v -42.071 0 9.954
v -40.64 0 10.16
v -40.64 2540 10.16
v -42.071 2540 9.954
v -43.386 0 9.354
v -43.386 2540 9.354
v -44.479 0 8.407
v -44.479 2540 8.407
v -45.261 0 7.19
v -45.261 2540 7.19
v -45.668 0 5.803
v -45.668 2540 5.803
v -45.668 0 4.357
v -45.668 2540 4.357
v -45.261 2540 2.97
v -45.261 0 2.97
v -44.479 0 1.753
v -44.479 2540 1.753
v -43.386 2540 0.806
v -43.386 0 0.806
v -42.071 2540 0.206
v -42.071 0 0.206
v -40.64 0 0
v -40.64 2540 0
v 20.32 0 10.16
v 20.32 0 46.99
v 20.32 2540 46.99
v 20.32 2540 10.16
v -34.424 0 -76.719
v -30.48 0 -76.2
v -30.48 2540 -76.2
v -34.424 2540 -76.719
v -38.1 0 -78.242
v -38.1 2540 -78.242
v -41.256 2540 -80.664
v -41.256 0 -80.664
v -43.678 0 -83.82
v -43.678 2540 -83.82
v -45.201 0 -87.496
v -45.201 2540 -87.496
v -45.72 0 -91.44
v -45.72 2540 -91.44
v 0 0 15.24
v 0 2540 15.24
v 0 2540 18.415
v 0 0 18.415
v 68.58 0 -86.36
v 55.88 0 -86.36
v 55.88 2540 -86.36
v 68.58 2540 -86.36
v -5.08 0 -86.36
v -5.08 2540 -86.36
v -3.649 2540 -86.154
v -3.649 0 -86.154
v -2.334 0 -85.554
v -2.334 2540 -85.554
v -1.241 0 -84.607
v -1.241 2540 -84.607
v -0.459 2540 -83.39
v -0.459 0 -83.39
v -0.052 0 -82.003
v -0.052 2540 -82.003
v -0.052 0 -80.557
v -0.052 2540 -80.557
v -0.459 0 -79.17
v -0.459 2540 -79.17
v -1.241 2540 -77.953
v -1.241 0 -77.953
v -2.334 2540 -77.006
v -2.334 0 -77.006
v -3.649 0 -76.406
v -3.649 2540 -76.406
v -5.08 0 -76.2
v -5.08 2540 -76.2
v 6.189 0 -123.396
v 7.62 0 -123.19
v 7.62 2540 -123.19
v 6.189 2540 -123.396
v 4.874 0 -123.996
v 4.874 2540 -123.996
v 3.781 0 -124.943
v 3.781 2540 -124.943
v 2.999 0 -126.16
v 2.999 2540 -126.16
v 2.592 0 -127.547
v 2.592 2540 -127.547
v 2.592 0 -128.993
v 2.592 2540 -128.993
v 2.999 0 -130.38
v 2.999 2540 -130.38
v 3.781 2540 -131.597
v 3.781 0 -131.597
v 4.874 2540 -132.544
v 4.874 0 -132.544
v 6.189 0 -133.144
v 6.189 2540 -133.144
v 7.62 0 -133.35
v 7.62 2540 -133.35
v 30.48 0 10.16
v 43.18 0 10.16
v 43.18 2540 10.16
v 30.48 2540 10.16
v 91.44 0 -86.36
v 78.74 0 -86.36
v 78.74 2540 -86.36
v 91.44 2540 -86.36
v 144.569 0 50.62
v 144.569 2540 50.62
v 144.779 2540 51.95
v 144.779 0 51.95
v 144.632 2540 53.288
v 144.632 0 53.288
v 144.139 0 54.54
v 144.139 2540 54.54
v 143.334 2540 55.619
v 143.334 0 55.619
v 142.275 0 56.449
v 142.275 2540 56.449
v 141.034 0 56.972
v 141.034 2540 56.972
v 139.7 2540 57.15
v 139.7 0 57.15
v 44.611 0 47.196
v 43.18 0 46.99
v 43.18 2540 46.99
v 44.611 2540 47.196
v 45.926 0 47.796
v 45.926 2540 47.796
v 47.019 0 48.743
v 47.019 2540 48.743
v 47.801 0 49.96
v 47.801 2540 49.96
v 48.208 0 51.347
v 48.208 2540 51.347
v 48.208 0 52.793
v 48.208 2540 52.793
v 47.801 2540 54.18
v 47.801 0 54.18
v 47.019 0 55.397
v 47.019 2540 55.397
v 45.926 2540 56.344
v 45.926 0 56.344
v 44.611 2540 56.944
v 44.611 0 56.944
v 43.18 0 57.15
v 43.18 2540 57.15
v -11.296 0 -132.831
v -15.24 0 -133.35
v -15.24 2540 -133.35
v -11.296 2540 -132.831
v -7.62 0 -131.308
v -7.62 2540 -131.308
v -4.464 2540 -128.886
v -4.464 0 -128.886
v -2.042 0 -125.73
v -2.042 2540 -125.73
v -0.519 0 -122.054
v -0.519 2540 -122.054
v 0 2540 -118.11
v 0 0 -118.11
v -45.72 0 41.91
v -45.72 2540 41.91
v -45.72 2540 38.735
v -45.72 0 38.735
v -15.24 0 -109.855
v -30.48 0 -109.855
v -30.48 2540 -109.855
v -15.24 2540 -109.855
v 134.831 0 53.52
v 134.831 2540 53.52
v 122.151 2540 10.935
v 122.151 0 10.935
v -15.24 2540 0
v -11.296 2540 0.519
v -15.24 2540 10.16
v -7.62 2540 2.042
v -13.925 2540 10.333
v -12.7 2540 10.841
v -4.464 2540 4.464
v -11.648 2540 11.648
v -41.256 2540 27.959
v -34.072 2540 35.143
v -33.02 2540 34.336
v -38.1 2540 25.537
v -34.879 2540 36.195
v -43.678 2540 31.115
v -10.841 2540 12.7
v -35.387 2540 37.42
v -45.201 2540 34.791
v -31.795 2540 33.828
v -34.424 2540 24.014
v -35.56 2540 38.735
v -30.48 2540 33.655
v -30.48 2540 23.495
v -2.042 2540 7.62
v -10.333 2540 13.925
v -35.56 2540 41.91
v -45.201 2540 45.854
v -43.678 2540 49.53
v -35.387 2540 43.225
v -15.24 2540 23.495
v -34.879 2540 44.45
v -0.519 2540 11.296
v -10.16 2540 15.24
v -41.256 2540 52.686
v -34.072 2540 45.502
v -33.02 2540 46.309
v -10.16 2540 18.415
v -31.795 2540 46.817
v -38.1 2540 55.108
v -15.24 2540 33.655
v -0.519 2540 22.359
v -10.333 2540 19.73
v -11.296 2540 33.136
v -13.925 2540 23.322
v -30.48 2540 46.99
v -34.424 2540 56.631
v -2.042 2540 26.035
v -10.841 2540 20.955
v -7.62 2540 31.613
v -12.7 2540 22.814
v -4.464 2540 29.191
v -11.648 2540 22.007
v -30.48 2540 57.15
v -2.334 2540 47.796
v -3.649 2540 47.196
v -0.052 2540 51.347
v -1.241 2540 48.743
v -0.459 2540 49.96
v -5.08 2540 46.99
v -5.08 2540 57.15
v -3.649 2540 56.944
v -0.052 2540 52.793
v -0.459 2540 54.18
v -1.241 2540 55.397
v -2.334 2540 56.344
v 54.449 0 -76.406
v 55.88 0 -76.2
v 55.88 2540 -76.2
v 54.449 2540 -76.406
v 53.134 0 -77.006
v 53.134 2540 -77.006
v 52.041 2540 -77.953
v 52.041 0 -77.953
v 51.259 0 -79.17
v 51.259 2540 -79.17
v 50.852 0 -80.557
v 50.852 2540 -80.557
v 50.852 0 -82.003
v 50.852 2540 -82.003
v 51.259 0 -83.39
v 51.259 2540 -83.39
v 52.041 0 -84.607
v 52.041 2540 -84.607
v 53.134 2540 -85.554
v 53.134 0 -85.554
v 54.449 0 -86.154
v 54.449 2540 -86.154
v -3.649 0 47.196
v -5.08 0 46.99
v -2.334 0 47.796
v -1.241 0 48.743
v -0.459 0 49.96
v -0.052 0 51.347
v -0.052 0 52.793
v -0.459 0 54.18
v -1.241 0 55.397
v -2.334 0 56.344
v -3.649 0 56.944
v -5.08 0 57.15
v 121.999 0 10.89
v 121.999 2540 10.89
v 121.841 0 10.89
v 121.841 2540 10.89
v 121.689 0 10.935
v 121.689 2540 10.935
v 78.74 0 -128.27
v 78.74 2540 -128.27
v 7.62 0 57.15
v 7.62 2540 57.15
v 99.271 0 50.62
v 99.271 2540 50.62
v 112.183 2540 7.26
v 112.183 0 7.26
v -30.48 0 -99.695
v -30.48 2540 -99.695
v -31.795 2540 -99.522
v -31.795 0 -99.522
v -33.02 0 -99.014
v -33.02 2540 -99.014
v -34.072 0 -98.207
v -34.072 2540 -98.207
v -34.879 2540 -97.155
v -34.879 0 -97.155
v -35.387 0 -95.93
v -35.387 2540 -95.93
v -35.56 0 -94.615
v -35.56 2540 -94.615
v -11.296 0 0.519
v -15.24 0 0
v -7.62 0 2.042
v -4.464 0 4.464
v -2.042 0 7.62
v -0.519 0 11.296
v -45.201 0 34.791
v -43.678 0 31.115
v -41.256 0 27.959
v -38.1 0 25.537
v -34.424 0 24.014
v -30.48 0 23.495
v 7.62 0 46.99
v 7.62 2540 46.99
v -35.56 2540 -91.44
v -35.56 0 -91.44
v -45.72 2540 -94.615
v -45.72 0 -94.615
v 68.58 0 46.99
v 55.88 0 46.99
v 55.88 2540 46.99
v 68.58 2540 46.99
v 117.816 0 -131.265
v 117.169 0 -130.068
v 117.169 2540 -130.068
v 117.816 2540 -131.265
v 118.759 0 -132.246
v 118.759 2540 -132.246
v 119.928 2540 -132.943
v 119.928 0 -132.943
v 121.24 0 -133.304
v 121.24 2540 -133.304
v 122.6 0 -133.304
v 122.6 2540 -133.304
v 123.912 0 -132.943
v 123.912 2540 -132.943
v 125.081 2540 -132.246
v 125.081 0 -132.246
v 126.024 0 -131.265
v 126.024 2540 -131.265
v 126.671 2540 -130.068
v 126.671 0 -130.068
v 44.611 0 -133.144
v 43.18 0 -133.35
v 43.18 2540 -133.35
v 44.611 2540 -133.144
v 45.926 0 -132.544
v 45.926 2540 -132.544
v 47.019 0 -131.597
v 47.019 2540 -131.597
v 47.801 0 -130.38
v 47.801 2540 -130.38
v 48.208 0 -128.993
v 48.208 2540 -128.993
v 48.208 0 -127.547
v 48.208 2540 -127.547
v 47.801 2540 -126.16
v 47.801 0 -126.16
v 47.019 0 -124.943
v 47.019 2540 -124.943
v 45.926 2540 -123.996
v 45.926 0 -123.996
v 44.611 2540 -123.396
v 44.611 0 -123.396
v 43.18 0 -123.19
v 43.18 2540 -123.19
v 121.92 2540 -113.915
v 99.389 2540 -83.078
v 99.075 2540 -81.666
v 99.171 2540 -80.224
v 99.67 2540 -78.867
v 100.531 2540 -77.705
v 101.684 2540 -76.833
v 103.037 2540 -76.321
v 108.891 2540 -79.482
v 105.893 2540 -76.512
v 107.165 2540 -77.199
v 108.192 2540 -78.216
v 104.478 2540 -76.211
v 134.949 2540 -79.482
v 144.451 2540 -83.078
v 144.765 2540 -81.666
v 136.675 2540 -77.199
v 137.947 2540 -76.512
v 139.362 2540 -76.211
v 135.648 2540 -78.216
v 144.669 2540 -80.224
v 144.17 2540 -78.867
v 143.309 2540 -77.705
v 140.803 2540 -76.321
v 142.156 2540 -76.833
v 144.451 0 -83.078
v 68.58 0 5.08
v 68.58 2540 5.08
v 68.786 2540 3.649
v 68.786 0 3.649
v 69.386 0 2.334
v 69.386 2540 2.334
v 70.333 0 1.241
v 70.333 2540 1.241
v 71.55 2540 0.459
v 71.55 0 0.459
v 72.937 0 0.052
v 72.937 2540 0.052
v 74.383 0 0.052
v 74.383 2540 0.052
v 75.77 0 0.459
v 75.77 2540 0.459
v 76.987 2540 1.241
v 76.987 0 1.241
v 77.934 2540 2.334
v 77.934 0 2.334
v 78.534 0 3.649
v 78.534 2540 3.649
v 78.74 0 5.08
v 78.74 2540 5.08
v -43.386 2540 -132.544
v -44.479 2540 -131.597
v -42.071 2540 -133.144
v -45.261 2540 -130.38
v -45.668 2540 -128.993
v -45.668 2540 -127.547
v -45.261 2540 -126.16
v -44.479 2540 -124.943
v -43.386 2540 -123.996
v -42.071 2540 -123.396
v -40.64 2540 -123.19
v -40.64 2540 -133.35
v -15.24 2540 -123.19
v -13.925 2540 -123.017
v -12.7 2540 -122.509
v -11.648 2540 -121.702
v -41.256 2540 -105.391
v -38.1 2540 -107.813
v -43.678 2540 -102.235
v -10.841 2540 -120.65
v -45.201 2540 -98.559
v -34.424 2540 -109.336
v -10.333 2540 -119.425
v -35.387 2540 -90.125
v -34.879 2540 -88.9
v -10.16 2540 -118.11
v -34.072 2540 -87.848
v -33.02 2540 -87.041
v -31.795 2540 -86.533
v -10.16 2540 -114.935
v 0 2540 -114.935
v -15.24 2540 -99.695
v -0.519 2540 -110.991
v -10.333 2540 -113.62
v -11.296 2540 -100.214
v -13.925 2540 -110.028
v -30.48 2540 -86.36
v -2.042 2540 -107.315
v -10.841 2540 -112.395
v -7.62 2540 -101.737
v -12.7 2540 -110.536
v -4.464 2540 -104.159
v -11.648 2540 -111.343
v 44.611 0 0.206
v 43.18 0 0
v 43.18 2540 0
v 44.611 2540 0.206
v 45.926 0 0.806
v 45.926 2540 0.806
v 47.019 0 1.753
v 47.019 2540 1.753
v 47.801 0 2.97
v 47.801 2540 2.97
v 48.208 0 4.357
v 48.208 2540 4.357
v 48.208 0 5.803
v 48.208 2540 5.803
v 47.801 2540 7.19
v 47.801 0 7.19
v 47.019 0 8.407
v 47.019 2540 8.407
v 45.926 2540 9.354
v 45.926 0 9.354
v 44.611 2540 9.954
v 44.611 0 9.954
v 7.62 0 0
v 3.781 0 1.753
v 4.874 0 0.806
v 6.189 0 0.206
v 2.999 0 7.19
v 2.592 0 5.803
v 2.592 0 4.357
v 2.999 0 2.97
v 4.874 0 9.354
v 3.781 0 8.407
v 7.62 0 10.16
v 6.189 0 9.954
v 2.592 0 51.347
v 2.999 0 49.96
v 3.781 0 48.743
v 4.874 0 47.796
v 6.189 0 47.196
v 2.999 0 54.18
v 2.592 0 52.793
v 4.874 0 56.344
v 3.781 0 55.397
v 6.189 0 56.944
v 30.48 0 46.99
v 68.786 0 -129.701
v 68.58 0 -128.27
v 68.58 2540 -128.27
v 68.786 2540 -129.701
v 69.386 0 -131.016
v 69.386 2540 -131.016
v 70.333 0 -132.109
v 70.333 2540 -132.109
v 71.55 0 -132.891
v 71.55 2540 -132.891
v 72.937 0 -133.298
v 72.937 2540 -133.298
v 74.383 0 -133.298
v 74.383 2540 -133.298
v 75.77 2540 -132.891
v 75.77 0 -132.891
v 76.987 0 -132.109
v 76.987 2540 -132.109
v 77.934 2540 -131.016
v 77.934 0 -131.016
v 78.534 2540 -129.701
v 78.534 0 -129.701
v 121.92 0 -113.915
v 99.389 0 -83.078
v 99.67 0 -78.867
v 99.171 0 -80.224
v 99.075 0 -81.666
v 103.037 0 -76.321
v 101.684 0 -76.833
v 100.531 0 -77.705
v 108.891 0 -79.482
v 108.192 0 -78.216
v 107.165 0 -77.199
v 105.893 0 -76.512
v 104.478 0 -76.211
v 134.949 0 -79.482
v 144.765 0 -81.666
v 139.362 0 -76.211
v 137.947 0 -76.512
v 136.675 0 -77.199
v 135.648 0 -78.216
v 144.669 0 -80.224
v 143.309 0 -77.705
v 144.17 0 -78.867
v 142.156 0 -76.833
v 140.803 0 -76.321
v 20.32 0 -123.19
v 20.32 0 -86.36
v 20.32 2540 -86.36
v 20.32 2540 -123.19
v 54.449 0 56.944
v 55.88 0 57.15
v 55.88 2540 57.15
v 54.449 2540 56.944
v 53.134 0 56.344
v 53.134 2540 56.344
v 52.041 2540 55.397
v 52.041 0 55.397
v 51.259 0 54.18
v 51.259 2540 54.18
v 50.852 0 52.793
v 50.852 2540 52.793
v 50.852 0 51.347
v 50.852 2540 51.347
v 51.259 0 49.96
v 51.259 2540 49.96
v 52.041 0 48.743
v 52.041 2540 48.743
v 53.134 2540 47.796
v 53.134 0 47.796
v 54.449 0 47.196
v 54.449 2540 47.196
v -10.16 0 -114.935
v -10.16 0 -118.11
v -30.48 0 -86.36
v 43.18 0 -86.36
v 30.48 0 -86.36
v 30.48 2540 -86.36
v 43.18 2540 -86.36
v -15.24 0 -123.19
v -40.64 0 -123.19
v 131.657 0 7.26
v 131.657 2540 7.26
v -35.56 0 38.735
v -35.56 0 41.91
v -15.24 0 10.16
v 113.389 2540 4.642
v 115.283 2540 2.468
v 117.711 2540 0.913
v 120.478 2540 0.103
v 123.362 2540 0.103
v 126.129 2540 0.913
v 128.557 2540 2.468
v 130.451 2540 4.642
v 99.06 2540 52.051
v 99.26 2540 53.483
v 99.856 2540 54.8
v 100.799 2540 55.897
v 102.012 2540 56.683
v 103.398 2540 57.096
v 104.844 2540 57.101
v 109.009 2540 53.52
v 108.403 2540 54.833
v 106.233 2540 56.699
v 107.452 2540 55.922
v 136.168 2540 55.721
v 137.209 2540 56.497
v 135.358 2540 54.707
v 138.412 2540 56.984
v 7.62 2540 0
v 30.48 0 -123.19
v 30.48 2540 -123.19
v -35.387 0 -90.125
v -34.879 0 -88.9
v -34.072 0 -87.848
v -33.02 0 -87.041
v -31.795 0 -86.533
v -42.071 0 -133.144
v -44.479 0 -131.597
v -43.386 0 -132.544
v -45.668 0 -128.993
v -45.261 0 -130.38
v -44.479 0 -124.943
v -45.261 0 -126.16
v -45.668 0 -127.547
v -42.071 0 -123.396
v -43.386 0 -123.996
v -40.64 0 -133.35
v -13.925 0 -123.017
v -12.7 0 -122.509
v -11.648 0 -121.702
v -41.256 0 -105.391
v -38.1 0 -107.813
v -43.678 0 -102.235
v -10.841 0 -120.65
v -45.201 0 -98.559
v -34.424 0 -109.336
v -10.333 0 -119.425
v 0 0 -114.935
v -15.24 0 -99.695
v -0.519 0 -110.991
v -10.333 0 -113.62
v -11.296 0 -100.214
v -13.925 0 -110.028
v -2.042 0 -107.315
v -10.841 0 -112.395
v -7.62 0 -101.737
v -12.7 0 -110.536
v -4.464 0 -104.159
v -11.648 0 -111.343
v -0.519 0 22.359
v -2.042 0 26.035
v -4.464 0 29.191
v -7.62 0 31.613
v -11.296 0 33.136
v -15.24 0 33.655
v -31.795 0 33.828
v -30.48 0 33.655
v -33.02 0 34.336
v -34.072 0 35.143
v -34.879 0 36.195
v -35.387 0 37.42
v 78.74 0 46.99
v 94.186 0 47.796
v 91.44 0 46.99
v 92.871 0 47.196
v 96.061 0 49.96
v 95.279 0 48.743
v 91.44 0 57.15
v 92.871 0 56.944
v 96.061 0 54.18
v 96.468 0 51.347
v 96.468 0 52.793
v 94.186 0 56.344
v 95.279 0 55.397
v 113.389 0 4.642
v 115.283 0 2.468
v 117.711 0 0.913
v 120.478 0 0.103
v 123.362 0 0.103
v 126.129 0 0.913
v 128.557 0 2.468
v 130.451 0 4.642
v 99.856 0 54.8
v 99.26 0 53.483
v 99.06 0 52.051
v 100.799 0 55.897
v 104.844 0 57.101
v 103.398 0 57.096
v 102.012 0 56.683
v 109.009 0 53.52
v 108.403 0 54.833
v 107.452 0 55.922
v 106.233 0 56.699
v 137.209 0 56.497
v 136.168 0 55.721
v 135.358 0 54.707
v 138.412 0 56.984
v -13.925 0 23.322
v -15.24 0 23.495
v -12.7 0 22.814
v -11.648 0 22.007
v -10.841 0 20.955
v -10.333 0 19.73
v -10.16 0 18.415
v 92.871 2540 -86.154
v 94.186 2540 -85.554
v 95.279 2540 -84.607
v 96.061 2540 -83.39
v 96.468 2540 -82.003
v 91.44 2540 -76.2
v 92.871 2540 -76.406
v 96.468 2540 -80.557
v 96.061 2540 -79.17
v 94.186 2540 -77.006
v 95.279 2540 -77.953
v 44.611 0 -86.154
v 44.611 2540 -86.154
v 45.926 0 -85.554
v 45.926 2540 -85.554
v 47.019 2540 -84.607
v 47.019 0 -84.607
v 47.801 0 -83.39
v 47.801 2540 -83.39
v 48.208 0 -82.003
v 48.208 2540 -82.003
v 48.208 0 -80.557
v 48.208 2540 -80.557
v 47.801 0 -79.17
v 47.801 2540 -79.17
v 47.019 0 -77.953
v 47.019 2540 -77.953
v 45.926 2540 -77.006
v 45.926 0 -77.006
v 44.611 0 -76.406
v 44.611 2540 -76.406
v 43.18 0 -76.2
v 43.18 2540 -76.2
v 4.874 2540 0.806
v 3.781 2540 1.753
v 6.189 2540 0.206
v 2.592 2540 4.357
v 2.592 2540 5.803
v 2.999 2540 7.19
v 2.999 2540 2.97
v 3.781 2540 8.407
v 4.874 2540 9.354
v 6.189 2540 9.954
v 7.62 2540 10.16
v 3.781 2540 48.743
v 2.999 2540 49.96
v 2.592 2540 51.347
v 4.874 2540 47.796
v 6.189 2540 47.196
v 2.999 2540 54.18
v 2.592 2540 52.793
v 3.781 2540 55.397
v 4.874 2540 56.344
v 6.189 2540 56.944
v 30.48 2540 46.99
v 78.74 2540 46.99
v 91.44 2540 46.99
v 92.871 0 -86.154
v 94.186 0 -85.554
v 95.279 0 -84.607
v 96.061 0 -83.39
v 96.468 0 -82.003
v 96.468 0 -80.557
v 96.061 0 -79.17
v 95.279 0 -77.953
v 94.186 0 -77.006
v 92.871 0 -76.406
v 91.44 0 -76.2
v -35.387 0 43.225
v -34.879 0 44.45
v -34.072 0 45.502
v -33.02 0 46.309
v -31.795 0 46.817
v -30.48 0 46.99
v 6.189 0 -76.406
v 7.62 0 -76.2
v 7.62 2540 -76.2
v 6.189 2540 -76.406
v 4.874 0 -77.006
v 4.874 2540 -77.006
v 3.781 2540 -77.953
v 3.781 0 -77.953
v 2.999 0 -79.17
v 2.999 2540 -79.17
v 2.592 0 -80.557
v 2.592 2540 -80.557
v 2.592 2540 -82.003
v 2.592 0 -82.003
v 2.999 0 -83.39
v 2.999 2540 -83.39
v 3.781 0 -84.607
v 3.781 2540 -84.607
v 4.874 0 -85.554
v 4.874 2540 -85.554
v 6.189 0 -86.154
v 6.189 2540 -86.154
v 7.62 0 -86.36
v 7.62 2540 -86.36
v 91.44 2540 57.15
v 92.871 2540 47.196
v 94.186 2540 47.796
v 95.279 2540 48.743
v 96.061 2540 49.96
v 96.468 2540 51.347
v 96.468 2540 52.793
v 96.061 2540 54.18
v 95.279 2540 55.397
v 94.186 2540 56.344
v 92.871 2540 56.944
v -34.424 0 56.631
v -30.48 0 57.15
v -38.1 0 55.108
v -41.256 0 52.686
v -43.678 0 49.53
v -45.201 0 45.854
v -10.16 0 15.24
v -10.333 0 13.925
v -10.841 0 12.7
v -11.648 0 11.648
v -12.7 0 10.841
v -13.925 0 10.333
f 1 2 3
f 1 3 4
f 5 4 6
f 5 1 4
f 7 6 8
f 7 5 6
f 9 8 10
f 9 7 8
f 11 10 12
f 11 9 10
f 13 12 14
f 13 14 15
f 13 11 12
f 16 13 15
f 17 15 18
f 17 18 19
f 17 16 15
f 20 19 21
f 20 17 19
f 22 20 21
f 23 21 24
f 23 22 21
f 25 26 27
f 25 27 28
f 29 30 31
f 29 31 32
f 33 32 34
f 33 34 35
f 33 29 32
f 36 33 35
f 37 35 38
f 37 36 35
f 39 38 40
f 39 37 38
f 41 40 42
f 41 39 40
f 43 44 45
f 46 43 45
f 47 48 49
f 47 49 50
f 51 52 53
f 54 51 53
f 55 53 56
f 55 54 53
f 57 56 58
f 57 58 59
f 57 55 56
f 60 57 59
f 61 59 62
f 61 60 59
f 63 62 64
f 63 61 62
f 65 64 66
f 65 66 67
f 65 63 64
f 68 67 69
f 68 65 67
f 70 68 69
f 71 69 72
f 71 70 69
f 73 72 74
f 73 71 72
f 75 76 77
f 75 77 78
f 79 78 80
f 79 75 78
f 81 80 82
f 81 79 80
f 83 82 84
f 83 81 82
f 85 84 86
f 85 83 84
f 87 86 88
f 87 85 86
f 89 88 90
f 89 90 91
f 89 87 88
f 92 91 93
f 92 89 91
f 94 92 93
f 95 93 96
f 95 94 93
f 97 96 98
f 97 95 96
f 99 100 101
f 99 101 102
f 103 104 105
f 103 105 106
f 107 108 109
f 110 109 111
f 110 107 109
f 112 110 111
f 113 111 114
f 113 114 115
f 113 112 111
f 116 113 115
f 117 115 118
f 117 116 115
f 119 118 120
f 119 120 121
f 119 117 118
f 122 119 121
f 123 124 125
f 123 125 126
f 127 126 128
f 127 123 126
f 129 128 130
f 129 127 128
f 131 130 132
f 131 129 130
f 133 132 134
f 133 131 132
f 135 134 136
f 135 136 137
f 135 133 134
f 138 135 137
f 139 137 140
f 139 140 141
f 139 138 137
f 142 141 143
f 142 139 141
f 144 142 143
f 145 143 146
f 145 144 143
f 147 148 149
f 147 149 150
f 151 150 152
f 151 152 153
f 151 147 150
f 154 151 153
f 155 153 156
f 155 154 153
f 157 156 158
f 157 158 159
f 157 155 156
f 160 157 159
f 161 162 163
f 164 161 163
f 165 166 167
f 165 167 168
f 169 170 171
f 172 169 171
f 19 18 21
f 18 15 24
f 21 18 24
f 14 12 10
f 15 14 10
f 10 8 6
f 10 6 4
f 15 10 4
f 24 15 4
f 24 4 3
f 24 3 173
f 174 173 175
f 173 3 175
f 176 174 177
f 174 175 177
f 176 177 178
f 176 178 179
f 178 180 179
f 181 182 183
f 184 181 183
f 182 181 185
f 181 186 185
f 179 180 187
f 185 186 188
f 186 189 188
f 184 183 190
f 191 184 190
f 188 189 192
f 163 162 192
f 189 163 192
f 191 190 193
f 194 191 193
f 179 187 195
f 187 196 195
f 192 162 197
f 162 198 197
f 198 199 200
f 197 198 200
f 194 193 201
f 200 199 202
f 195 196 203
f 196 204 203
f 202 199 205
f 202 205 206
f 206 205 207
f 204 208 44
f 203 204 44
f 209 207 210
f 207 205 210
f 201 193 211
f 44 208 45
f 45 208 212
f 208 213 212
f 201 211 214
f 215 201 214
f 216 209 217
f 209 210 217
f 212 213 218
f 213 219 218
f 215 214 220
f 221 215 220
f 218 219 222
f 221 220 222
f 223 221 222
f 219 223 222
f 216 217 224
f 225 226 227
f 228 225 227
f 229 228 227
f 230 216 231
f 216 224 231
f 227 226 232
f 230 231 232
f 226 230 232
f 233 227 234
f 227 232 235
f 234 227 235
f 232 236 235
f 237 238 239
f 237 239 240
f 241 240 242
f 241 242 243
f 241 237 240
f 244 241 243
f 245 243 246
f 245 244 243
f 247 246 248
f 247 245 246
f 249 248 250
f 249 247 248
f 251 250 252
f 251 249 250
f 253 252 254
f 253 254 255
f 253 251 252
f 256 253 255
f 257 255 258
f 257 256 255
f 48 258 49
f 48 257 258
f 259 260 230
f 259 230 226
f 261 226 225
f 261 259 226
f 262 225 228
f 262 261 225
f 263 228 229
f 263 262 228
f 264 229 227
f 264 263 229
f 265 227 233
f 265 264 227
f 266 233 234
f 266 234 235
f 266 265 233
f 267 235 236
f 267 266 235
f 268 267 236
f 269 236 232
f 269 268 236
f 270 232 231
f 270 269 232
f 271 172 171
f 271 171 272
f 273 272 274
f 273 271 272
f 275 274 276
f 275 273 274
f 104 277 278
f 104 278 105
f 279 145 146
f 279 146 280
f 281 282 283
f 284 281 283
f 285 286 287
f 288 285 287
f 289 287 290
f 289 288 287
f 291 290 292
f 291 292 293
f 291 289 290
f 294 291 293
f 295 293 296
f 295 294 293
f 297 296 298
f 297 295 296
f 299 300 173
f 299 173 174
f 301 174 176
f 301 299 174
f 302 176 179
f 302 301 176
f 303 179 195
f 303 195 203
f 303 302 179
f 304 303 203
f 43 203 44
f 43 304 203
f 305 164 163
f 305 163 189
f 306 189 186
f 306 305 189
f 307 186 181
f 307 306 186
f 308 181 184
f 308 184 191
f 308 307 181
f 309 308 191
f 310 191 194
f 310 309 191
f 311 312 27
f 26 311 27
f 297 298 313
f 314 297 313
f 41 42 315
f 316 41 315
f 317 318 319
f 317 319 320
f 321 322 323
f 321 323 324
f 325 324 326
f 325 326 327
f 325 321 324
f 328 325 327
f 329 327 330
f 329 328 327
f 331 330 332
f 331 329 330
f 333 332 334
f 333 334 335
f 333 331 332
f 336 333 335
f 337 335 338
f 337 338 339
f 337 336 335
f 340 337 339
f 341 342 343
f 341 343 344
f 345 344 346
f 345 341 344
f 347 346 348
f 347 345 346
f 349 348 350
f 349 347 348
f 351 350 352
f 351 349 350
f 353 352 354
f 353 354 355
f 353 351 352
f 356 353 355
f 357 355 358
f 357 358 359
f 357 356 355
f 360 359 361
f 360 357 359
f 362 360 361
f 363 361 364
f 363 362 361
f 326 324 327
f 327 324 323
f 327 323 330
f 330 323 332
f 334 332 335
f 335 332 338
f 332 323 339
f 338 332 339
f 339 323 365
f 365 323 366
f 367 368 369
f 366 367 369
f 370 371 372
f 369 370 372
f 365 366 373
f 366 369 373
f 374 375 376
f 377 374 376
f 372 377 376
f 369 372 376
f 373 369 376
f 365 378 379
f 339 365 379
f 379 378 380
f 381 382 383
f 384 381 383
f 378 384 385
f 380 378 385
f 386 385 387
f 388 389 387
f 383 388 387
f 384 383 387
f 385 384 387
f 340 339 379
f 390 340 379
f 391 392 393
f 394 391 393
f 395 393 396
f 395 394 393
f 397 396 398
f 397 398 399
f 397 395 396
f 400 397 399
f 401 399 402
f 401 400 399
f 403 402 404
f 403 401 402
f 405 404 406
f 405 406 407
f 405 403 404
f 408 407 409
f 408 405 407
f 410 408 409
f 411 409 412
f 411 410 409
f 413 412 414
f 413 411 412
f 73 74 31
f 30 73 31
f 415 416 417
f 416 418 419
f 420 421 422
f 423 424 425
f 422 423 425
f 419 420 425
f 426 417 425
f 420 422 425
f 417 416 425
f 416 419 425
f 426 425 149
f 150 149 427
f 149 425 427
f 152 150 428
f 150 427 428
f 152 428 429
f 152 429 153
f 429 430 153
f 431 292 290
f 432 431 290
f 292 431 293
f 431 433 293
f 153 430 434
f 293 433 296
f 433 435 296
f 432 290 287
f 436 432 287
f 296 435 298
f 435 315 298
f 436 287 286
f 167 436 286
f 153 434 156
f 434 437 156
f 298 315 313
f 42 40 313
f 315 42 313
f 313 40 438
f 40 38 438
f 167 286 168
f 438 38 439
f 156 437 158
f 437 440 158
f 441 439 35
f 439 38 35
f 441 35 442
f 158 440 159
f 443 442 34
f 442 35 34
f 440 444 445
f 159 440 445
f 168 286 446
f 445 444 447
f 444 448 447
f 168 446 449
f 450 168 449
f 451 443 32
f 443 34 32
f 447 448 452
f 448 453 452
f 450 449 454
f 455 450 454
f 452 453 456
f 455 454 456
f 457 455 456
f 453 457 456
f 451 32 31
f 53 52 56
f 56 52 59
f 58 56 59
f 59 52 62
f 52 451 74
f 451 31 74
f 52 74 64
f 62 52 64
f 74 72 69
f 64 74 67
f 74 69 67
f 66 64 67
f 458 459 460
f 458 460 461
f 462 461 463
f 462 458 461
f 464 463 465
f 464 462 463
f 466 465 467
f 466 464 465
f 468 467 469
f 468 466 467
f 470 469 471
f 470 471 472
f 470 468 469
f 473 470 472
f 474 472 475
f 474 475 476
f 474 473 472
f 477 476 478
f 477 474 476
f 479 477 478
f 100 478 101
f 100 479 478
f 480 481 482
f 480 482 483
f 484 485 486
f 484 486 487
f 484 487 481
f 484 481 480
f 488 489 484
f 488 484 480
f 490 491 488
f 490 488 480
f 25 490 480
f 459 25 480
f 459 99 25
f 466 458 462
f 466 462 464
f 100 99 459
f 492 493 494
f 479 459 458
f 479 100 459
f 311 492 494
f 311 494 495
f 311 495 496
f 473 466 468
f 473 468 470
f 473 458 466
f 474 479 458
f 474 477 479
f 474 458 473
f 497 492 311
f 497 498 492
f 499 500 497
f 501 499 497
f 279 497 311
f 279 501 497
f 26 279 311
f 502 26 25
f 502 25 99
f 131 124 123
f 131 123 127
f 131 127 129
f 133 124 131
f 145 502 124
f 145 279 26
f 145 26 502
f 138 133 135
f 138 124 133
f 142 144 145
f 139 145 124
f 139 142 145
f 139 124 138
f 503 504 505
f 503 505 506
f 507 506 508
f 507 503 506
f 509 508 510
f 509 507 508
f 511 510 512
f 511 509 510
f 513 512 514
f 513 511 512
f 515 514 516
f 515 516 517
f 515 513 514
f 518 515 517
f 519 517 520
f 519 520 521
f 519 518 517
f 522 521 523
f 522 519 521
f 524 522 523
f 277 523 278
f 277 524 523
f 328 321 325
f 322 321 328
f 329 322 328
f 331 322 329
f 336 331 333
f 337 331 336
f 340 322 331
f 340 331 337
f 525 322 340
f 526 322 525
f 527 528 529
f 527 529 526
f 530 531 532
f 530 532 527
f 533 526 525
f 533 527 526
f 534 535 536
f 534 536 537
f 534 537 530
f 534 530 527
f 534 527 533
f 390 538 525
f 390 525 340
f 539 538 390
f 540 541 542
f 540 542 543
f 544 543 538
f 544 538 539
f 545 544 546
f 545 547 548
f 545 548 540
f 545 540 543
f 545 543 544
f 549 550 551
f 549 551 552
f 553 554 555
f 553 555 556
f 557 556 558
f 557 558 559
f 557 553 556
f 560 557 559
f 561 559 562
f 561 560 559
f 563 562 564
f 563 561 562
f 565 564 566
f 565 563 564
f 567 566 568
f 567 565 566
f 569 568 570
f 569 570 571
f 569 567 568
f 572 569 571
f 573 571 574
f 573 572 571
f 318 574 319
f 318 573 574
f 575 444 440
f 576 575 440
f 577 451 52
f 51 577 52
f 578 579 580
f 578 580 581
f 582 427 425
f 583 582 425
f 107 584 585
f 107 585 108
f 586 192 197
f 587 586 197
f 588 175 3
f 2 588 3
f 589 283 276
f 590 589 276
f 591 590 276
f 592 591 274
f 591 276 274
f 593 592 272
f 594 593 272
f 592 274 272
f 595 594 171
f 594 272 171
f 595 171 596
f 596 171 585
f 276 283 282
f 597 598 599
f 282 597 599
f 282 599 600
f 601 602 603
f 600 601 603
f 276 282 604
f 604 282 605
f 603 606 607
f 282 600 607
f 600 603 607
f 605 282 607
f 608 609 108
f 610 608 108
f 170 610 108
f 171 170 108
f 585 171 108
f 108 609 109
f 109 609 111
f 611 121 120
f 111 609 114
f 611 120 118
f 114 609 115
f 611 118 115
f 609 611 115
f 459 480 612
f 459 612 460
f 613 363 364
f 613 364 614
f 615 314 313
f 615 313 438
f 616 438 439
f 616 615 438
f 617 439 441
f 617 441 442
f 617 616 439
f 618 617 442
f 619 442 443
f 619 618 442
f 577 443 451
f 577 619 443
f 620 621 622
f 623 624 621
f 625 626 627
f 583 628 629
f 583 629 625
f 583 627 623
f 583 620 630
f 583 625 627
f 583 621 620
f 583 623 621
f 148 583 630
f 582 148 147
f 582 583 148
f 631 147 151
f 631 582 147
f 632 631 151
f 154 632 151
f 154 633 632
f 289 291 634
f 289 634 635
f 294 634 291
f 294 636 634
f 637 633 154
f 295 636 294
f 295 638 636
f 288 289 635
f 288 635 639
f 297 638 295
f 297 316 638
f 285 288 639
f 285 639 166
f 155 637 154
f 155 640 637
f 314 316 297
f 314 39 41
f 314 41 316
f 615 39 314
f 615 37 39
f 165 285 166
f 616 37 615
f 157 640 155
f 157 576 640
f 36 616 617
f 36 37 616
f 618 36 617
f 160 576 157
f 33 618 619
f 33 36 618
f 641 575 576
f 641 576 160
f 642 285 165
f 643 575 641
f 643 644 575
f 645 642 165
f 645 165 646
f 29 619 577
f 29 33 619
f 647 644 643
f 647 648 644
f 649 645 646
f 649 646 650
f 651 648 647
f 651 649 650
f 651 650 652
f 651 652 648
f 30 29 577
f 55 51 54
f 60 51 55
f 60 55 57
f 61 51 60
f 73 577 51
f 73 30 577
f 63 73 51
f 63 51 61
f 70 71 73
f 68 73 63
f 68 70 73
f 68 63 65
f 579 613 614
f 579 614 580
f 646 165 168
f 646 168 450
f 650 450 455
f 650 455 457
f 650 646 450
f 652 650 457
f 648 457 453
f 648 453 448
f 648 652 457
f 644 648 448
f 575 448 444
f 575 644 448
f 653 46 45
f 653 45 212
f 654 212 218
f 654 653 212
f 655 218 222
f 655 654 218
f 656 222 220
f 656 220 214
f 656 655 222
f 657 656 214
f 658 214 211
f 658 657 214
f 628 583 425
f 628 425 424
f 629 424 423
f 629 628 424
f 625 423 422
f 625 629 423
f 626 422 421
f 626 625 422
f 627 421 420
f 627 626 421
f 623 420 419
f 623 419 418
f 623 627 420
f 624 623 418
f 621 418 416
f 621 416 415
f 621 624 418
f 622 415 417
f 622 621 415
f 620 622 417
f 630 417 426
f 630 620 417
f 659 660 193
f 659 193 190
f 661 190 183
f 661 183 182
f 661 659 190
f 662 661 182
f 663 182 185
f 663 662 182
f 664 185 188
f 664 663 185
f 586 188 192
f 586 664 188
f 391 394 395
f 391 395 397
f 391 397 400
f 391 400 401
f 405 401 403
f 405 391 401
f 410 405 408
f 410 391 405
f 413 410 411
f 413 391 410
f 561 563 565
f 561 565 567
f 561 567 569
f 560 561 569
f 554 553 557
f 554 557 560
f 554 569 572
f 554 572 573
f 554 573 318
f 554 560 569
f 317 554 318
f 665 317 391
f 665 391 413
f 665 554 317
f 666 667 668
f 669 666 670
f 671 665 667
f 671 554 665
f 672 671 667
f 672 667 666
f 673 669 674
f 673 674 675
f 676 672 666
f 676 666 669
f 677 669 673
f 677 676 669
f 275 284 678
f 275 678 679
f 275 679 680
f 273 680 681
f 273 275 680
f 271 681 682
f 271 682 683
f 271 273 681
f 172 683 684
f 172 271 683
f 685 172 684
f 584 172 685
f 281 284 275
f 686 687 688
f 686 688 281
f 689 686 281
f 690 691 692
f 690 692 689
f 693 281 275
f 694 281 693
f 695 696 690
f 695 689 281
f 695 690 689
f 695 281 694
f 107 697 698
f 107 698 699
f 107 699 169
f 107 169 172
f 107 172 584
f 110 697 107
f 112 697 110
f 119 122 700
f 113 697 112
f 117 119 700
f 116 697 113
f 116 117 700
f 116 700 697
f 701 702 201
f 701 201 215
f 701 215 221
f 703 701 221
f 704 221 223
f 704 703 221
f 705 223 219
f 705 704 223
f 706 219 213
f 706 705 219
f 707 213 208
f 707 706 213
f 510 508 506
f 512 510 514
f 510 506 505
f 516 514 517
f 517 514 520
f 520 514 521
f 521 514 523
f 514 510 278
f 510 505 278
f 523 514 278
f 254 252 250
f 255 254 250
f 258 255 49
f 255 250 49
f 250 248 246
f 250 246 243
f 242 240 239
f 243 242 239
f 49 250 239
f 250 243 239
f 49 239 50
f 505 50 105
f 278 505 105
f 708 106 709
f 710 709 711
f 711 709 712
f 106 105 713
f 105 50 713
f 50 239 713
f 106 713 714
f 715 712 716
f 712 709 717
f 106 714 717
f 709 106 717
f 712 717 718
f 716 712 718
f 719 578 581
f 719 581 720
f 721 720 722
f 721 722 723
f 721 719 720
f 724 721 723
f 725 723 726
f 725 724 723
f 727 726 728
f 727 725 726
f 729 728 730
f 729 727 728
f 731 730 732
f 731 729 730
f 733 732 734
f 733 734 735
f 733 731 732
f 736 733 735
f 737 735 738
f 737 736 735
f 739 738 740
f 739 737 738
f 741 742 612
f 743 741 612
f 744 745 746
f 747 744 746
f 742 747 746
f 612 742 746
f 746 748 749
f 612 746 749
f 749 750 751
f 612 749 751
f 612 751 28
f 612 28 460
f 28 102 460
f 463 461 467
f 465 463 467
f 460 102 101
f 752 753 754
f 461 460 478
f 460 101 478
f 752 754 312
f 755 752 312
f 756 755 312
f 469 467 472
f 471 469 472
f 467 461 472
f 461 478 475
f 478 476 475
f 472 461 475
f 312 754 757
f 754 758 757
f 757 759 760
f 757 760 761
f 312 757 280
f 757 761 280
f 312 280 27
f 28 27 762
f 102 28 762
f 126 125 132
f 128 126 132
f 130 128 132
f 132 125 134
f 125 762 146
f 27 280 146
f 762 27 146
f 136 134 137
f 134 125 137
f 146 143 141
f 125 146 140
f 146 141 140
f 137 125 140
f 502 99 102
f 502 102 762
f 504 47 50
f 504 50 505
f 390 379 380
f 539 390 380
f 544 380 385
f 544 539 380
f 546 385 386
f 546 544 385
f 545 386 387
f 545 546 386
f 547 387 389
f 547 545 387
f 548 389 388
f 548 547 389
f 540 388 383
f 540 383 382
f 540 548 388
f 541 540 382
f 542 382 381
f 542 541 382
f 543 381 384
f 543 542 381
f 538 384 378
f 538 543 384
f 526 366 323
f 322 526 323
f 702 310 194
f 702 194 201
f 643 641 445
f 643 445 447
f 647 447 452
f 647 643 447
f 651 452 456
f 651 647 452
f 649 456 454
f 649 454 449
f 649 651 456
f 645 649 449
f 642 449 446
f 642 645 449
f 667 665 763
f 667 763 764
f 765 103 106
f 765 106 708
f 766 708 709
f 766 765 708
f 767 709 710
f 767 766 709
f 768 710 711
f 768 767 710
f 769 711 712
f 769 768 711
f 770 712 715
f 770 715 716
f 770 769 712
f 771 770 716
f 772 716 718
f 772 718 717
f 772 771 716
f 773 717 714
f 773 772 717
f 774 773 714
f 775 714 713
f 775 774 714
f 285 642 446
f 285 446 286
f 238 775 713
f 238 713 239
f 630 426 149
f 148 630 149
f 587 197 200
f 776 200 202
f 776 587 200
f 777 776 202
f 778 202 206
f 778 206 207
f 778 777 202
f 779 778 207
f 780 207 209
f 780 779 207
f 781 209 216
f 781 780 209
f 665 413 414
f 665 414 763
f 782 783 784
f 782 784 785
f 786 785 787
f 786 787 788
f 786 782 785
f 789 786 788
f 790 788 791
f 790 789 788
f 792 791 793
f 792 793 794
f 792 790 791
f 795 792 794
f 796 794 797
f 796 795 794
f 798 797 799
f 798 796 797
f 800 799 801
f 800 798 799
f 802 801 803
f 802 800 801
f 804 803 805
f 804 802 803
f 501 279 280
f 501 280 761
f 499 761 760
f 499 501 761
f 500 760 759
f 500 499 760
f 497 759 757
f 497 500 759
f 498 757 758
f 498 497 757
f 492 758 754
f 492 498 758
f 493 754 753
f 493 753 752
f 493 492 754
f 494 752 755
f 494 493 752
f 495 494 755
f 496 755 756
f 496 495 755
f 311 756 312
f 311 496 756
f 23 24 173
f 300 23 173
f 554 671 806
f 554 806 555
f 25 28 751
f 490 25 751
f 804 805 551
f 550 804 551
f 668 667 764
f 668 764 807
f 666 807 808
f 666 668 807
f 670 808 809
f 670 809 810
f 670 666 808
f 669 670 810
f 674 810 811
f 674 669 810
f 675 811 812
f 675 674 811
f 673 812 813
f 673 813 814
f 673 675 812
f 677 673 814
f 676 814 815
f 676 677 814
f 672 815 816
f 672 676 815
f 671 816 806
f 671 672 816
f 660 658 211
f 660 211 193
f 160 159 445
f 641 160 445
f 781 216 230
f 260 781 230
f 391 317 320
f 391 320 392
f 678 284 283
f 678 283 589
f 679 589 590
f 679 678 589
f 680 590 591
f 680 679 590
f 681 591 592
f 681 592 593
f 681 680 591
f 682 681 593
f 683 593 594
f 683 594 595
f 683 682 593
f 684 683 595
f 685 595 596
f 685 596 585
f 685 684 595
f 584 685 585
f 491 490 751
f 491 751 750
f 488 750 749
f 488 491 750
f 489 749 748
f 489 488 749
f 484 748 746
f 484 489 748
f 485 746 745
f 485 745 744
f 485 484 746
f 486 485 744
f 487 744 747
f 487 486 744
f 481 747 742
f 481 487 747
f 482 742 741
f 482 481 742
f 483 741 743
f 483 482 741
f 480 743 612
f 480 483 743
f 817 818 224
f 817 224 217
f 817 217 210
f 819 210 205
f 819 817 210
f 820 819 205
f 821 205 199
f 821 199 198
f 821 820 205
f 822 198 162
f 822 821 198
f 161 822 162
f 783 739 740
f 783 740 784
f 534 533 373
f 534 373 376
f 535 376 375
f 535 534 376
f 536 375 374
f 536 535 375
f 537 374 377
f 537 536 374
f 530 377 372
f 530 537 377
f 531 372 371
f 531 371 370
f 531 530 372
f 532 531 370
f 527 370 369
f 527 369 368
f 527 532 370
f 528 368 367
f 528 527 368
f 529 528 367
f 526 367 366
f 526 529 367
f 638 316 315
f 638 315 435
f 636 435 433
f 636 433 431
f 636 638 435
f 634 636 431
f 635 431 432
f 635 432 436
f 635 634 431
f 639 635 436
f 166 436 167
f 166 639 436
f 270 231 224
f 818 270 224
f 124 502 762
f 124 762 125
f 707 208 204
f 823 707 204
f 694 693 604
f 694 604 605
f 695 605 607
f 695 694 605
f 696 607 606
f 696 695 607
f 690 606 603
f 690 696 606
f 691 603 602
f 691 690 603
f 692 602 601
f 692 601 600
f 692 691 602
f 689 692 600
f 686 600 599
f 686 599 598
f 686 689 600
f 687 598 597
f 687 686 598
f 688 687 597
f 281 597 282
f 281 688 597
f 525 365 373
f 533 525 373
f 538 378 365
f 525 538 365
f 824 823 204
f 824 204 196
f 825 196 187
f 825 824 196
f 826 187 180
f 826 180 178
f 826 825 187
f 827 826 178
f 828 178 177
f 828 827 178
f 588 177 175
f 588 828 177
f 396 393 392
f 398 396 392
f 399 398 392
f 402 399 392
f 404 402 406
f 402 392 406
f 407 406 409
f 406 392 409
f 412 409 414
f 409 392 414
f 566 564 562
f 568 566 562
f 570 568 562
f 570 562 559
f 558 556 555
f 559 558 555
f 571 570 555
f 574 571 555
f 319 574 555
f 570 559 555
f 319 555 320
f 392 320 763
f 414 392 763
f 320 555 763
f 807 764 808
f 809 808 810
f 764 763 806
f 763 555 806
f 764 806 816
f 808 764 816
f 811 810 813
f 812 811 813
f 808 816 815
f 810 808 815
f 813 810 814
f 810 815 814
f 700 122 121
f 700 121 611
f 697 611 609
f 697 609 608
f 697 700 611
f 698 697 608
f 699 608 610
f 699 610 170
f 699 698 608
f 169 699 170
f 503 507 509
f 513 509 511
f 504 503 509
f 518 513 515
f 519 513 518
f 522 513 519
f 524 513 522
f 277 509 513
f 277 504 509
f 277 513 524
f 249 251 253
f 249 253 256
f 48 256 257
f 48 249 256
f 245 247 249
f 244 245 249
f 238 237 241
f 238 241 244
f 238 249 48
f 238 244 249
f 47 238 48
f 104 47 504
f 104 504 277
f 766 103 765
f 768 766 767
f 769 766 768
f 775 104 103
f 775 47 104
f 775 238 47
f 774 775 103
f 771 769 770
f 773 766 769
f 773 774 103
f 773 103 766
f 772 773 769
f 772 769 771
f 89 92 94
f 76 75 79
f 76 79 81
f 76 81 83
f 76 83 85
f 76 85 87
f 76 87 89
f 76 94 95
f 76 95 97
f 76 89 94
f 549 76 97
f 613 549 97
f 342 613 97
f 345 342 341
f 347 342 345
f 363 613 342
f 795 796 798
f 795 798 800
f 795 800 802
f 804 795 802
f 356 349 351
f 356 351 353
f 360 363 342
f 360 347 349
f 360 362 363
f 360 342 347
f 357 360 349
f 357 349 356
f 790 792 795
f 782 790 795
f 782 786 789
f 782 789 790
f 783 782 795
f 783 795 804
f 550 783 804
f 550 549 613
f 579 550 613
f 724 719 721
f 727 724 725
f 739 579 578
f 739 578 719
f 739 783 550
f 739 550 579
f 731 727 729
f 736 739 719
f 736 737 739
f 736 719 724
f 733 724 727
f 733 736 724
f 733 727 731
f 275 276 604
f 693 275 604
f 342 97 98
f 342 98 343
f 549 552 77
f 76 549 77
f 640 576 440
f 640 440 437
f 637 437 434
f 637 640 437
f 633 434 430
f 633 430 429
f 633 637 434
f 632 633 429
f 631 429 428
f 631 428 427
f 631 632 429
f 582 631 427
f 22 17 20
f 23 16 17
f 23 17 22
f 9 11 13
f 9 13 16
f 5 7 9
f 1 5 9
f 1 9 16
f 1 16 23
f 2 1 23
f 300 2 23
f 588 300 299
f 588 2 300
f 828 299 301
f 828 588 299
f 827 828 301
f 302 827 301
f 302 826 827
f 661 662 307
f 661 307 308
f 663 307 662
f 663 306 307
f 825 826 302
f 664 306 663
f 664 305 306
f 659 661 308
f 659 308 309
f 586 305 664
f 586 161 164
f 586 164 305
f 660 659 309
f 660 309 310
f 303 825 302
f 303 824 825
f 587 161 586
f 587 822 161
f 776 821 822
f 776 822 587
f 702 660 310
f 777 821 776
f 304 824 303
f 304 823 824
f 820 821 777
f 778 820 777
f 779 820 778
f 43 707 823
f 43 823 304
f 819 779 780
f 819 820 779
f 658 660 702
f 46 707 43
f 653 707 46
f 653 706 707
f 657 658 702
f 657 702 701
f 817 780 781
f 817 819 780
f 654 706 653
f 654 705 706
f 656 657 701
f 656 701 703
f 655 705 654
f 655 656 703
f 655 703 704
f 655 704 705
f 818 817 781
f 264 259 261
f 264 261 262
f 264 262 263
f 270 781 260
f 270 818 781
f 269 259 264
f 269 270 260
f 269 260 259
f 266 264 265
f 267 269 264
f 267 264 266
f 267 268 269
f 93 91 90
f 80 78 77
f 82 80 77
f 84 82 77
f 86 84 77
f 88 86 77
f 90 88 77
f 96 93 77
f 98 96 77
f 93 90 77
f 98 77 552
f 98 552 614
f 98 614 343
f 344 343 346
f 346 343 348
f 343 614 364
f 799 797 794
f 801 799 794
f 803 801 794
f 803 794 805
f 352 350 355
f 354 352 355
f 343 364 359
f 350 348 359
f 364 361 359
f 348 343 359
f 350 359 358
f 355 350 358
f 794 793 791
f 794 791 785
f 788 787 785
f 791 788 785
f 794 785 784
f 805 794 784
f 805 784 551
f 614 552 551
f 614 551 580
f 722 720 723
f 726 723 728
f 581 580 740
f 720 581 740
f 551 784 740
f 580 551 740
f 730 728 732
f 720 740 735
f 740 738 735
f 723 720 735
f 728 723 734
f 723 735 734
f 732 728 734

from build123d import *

# Parameters (mm, degrees)
F1_DEPTH = 2540


with BuildPart() as f1:
    # F0 (on Front) → F1 (new body)
    with BuildSketch(Plane.XZ):
        with BuildLine():
            ThreePointArc((-40.64, 10.16), (-45.72, 5.08), (-40.64, 0))
            Line((-40.64, 0), (-15.24, 0))
            ThreePointArc((-15.24, 0), (-4.463693, 4.463693), (0, 15.24))
            Line((0, 15.24), (0, 18.415))
            ThreePointArc((0, 18.415), (-4.463693, 29.191307), (-15.24, 33.655))
            Line((-15.24, 33.655), (-30.48, 33.655))
            ThreePointArc((-30.48, 33.655), (-34.072102, 35.142898), (-35.56, 38.735))
            Line((-35.56, 38.735), (-35.56, 41.91))
            ThreePointArc((-35.56, 41.91), (-34.072102, 45.502102), (-30.48, 46.99))
            Line((-30.48, 46.99), (-5.08, 46.99))
            ThreePointArc((-5.08, 46.99), (0, 52.07), (-5.08, 57.15))
            Line((-5.08, 57.15), (-30.48, 57.15))
            ThreePointArc((-30.48, 57.15), (-41.256307, 52.686307), (-45.72, 41.91))
            Line((-45.72, 41.91), (-45.72, 38.735))
            ThreePointArc((-45.72, 38.735), (-41.256307, 27.958693), (-30.48, 23.495))
            Line((-30.48, 23.495), (-15.24, 23.495))
            ThreePointArc((-15.24, 23.495), (-11.647898, 22.007102), (-10.16, 18.415))
            Line((-10.16, 18.415), (-10.16, 15.24))
            ThreePointArc((-10.16, 15.24), (-11.647898, 11.647898), (-15.24, 10.16))
            Line((-15.24, 10.16), (-40.64, 10.16))
        make_face()
        with BuildLine():
            ThreePointArc((7.62, 10.16), (2.54, 5.08), (7.62, 0))
            Line((7.62, 0), (43.18, 0))
            ThreePointArc((43.18, 0), (48.26, 5.08), (43.18, 10.16))
            Line((43.18, 10.16), (30.48, 10.16))
            Line((30.48, 10.16), (30.48, 46.99))
            Line((30.48, 46.99), (43.18, 46.99))
            ThreePointArc((43.18, 46.99), (48.26, 52.07), (43.18, 57.15))
            Line((43.18, 57.15), (7.62, 57.15))
            ThreePointArc((7.62, 57.15), (2.54, 52.07), (7.62, 46.99))
            Line((7.62, 46.99), (20.32, 46.99))
            Line((20.32, 46.99), (20.32, 10.16))
            Line((20.32, 10.16), (7.62, 10.16))
        make_face()
        with BuildLine():
            ThreePointArc((55.88, 57.15), (50.8, 52.07), (55.88, 46.99))
            Line((55.88, 46.99), (68.58, 46.99))
            Line((68.58, 46.99), (68.58, 5.08))
            ThreePointArc((68.58, 5.08), (73.66, 0), (78.74, 5.08))
            Line((78.74, 5.08), (78.74, 46.99))
            Line((78.74, 46.99), (91.44, 46.99))
            ThreePointArc((91.44, 46.99), (96.52, 52.07), (91.44, 57.15))
            Line((91.44, 57.15), (55.88, 57.15))
        make_face()
        with BuildLine():
            ThreePointArc((109.008735, 53.519766), (102.690234, 56.938735), (99.271265, 50.620234))
            Line((99.271265, 50.620234), (109.008735, 53.519766))
        make_face()
        with BuildLine():
            Line((109.008735, 53.519766), (99.271265, 50.620234))
            Line((99.271265, 50.620234), (112.182531, 7.260467))
            ThreePointArc((112.182531, 7.260467), (121.92, 0), (131.65747, 7.260467))
            Line((131.65747, 7.260467), (144.568735, 50.620234))
            ThreePointArc((144.568735, 50.620234), (143.772543, 55.106576), (139.7, 57.15))
            ThreePointArc((139.7, 57.15), (136.663424, 56.142543), (134.831265, 53.519766))
            Line((134.831265, 53.519766), (122.150792, 10.935065))
            Line((122.150792, 10.935065), (121.92, 10.16))
            Line((121.92, 10.16), (121.689208, 10.935065))
            Line((121.689208, 10.935065), (109.008735, 53.519766))
        make_face()
        with BuildLine():
            ThreePointArc((122.150792, 10.935065), (121.92, 10.8839), (121.689208, 10.935065))
            Line((121.689208, 10.935065), (121.92, 10.16))
            Line((121.92, 10.16), (122.150792, 10.935065))
        make_face()
        with BuildLine():
            ThreePointArc((108.891254, -79.482228), (102.342228, -76.528746), (99.388746, -83.077772))
            Line((99.388746, -83.077772), (117.168746, -130.067772))
            ThreePointArc((117.168746, -130.067772), (121.92, -133.35), (126.671254, -130.067772))
            ThreePointArc((126.671254, -130.067772), (127, -128.27), (126.671254, -126.472228))
            Line((126.671254, -126.472228), (121.92, -113.915342))
            Line((121.92, -113.915342), (108.891254, -79.482228))
        make_face()
        with BuildLine():
            ThreePointArc((126.671254, -126.472228), (127, -128.27), (126.671254, -130.067772))
            Line((126.671254, -130.067772), (144.451254, -83.077772))
            Line((144.451254, -83.077772), (134.948746, -79.482228))
            Line((134.948746, -79.482228), (121.92, -113.915342))
            Line((121.92, -113.915342), (126.671254, -126.472228))
        make_face()
        with BuildLine():
            Line((134.948746, -79.482228), (144.451254, -83.077772))
            ThreePointArc((144.451254, -83.077772), (141.497772, -76.528746), (134.948746, -79.482228))
        make_face()
        with BuildLine():
            ThreePointArc((-40.64, -123.19), (-45.72, -128.27), (-40.64, -133.35))
            Line((-40.64, -133.35), (-15.24, -133.35))
            ThreePointArc((-15.24, -133.35), (-4.463693, -128.886307), (0, -118.11))
            Line((0, -118.11), (0, -114.935))
            ThreePointArc((0, -114.935), (-4.463693, -104.158693), (-15.24, -99.695))
            Line((-15.24, -99.695), (-30.48, -99.695))
            ThreePointArc((-30.48, -99.695), (-34.072102, -98.207102), (-35.56, -94.615))
            Line((-35.56, -94.615), (-35.56, -91.44))
            ThreePointArc((-35.56, -91.44), (-34.072102, -87.847898), (-30.48, -86.36))
            Line((-30.48, -86.36), (-5.08, -86.36))
            ThreePointArc((-5.08, -86.36), (0, -81.28), (-5.08, -76.2))
            Line((-5.08, -76.2), (-30.48, -76.2))
            ThreePointArc((-30.48, -76.2), (-41.256307, -80.663693), (-45.72, -91.44))
            Line((-45.72, -91.44), (-45.72, -94.615))
            ThreePointArc((-45.72, -94.615), (-41.256307, -105.391307), (-30.48, -109.855))
            Line((-30.48, -109.855), (-15.24, -109.855))
            ThreePointArc((-15.24, -109.855), (-11.647898, -111.342898), (-10.16, -114.935))
            Line((-10.16, -114.935), (-10.16, -118.11))
            ThreePointArc((-10.16, -118.11), (-11.647898, -121.702102), (-15.24, -123.19))
            Line((-15.24, -123.19), (-40.64, -123.19))
        make_face()
        with BuildLine():
            ThreePointArc((7.62, -123.19), (2.54, -128.27), (7.62, -133.35))
            Line((7.62, -133.35), (43.18, -133.35))
            ThreePointArc((43.18, -133.35), (48.26, -128.27), (43.18, -123.19))
            Line((43.18, -123.19), (30.48, -123.19))
            Line((30.48, -123.19), (30.48, -86.36))
            Line((30.48, -86.36), (43.18, -86.36))
            ThreePointArc((43.18, -86.36), (48.26, -81.28), (43.18, -76.2))
            Line((43.18, -76.2), (7.62, -76.2))
            ThreePointArc((7.62, -76.2), (2.54, -81.28), (7.62, -86.36))
            Line((7.62, -86.36), (20.32, -86.36))
            Line((20.32, -86.36), (20.32, -123.19))
            Line((20.32, -123.19), (7.62, -123.19))
        make_face()
        with BuildLine():
            ThreePointArc((55.88, -76.2), (50.8, -81.28), (55.88, -86.36))
            Line((55.88, -86.36), (68.58, -86.36))
            Line((68.58, -86.36), (68.58, -128.27))
            ThreePointArc((68.58, -128.27), (73.66, -133.35), (78.74, -128.27))
            Line((78.74, -128.27), (78.74, -86.36))
            Line((78.74, -86.36), (91.44, -86.36))
            ThreePointArc((91.44, -86.36), (96.52, -81.28), (91.44, -76.2))
            Line((91.44, -76.2), (55.88, -76.2))
        make_face()
    extrude(amount=-F1_DEPTH)


solid = f1.part
